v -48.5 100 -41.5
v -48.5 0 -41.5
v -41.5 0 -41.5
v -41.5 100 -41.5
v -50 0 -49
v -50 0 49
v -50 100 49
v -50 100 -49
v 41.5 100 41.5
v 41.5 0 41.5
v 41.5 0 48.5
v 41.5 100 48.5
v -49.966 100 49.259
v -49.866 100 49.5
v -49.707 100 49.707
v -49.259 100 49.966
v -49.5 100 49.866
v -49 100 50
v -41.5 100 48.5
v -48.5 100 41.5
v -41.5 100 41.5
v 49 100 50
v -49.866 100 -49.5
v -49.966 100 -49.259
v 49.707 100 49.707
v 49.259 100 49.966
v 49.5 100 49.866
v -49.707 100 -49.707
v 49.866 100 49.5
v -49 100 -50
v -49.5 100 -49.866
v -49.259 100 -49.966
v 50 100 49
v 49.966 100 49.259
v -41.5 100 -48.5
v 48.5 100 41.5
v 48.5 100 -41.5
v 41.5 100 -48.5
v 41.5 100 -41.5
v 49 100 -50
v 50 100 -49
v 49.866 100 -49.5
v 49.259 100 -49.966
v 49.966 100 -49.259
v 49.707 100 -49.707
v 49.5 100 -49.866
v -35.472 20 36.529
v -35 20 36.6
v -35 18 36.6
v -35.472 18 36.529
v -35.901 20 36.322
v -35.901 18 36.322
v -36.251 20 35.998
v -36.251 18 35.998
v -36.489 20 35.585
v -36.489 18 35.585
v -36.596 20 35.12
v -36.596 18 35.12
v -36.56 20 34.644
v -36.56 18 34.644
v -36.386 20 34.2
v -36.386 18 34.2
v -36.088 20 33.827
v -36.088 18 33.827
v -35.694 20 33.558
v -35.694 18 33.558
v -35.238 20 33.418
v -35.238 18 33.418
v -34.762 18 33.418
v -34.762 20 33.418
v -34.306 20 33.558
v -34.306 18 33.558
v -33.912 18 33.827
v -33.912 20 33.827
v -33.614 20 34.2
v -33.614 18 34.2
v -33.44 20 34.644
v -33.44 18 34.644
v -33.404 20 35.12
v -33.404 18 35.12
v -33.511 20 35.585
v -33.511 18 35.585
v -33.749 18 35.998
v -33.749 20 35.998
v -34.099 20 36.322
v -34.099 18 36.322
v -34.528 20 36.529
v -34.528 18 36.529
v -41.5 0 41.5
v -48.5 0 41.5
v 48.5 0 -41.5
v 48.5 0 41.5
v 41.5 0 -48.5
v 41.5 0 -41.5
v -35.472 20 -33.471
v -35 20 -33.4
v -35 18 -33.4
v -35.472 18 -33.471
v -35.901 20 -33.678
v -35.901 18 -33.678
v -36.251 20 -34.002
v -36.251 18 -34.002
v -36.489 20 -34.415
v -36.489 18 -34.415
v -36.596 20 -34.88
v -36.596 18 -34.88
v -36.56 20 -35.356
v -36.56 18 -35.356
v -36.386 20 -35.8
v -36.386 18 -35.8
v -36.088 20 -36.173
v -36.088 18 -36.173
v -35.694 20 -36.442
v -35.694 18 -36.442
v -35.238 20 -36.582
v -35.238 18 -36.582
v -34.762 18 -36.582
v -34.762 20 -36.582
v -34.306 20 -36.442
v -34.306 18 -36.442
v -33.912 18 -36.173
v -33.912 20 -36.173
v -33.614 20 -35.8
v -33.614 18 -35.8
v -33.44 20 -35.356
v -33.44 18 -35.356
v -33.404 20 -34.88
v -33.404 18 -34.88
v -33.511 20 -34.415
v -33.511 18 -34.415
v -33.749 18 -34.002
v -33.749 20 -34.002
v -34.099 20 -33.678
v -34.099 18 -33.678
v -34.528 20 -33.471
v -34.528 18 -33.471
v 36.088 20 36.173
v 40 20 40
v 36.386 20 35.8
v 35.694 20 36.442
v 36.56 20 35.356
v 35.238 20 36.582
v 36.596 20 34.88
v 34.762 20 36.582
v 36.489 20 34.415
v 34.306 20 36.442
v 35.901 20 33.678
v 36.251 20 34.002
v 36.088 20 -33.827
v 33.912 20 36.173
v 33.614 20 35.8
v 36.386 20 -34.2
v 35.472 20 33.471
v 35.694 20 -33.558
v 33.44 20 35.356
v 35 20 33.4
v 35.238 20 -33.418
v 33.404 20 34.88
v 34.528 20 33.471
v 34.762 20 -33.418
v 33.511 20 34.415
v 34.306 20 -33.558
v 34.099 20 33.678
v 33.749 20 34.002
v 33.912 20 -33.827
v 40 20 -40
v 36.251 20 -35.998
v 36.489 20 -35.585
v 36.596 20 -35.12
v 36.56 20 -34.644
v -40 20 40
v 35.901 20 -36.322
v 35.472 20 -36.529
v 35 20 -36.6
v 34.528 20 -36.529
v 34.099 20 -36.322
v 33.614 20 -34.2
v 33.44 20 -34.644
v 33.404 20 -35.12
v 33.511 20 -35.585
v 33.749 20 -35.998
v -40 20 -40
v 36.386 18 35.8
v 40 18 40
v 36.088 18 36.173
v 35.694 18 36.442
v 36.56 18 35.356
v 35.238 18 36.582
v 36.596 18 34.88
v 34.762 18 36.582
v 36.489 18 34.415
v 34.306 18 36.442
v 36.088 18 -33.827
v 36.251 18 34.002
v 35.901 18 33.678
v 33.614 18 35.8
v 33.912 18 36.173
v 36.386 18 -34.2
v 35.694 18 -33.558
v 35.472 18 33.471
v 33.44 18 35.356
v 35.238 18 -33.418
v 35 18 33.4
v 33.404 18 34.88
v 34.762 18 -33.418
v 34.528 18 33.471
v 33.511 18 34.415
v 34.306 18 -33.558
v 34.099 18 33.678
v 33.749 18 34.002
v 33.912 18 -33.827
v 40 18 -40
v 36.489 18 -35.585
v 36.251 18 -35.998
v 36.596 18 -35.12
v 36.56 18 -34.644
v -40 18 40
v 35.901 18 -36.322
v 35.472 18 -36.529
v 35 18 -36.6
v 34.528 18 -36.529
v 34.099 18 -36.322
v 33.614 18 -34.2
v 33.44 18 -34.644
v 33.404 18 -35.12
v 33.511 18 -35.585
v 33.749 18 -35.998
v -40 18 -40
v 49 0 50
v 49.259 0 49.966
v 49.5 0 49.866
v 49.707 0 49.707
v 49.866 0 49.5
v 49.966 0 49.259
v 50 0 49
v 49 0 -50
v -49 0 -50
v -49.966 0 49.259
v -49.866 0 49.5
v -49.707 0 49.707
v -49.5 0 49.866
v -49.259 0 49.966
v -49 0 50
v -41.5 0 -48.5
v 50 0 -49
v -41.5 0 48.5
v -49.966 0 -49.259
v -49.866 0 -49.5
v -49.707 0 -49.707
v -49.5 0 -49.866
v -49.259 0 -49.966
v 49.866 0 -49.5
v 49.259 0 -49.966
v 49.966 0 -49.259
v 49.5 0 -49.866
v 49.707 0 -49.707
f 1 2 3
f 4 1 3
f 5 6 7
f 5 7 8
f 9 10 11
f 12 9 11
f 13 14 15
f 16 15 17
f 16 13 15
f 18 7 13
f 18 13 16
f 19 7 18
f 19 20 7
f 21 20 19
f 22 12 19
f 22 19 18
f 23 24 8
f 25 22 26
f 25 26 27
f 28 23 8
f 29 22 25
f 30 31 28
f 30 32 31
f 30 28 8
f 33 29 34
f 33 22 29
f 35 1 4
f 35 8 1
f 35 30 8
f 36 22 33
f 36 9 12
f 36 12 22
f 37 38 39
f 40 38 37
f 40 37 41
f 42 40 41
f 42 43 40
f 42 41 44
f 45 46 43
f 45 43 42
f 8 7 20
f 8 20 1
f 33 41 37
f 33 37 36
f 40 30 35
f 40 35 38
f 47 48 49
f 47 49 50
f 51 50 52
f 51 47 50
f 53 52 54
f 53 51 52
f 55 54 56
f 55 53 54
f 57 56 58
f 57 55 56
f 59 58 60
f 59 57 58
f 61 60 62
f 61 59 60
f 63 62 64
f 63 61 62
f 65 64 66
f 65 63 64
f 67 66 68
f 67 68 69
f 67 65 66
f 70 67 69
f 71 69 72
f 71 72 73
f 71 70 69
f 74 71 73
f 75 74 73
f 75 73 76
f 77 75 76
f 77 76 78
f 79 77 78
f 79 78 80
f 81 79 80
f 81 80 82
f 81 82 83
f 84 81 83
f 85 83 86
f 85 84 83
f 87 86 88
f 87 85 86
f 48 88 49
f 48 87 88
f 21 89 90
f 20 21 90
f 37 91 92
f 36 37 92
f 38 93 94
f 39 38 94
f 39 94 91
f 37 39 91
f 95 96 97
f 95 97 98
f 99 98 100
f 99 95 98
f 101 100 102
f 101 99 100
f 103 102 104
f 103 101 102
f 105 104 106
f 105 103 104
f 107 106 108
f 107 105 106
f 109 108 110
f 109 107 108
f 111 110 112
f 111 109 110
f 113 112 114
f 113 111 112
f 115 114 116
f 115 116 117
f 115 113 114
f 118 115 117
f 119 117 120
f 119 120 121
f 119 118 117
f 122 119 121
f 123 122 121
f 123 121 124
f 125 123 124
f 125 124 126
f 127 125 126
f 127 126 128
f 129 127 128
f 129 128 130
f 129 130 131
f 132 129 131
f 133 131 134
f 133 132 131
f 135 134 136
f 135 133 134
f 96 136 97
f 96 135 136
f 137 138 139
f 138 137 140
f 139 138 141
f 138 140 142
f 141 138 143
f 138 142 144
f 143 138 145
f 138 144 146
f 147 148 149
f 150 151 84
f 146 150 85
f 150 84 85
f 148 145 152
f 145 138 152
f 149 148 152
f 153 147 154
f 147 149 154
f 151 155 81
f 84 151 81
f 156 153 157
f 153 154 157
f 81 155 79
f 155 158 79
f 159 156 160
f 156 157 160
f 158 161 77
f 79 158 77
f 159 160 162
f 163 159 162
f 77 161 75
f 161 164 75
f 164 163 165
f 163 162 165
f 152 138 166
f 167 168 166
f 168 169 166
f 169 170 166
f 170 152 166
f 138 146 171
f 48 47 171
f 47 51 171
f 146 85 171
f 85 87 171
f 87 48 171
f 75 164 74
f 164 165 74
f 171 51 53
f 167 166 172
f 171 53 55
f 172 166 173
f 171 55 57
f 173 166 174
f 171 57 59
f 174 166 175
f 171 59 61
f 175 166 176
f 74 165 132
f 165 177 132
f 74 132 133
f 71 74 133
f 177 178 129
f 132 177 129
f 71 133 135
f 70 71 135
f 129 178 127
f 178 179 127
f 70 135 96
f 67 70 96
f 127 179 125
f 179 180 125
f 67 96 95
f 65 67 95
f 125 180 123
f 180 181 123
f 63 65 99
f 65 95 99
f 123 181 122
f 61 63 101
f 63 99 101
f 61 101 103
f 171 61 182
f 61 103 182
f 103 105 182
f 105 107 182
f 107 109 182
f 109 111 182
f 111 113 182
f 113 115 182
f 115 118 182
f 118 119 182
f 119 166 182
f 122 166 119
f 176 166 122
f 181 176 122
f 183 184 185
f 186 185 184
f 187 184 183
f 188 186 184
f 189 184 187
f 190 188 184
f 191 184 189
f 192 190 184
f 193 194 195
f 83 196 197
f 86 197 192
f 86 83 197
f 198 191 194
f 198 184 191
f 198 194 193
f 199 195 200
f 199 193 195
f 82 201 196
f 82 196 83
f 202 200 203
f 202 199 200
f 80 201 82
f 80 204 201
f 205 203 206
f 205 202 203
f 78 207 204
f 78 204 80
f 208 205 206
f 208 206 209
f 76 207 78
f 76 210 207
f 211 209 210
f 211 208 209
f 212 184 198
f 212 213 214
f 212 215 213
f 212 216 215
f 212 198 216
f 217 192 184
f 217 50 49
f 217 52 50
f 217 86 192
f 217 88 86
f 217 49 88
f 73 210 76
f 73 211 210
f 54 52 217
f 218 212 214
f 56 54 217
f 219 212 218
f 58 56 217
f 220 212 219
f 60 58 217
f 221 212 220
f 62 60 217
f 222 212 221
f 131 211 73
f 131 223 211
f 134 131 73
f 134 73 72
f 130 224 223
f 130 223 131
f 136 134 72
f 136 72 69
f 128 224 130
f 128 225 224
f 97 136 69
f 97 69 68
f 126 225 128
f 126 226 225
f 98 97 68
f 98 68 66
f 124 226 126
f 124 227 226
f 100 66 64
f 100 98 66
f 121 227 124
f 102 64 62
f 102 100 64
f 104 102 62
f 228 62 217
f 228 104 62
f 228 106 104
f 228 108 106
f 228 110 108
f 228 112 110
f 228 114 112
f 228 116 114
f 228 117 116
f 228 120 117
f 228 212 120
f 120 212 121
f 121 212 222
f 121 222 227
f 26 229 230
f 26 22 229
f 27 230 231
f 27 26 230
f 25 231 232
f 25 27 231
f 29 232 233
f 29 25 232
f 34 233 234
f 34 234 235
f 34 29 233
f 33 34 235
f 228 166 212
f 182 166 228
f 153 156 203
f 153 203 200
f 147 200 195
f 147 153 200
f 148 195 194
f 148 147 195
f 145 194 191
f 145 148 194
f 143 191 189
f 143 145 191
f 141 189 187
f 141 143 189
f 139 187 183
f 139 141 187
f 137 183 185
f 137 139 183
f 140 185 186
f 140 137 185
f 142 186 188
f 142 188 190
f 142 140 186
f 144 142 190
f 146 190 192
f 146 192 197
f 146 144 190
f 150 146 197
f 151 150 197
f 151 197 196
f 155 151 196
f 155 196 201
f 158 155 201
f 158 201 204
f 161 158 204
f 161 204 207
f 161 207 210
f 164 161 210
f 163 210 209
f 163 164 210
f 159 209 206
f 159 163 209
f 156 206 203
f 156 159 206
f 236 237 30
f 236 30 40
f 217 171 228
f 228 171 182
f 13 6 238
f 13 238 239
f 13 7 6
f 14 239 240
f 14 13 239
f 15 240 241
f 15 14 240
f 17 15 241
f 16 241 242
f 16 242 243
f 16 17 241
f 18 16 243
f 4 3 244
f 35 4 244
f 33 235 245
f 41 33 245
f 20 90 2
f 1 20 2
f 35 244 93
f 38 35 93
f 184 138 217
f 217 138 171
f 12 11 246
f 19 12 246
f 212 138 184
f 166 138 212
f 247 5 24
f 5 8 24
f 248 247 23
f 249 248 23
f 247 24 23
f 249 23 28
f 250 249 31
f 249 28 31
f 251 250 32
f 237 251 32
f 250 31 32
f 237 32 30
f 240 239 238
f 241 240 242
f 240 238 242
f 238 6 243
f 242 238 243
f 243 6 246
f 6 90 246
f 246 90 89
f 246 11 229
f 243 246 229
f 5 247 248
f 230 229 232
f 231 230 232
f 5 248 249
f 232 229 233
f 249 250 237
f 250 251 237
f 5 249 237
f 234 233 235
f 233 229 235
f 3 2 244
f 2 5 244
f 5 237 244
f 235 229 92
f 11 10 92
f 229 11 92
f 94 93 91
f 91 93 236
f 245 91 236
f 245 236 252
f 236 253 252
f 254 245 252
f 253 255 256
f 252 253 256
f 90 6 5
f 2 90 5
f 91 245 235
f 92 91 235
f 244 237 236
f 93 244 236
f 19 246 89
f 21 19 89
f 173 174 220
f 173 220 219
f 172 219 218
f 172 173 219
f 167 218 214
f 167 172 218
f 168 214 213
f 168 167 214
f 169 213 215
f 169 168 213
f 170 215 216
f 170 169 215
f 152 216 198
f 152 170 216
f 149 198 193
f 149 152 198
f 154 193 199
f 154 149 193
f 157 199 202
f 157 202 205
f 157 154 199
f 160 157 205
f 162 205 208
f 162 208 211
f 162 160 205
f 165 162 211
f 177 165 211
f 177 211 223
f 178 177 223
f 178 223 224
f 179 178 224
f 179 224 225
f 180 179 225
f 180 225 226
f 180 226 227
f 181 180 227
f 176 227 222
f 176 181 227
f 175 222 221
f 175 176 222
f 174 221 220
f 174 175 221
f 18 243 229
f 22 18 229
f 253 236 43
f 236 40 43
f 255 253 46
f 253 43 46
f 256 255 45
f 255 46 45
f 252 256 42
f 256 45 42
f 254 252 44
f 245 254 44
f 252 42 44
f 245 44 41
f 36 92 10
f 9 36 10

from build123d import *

# Parameters (mm, degrees)
SKETCH1_W           = 100
SKETCH1_H           = 100
BOSS_EXTRUDE2_DEPTH = 100
SKETCH2_W           = 80
SKETCH2_H           = 80
SKETCH2_R           = 1.6
BOSS_EXTRUDE3_DEPTH = 2
FILLET1_R           = 1


with BuildPart() as part:
    # Sketch1 → Boss-Extrude2 (new body)
    with BuildSketch(Plane(origin=(0, 0, 0), x_dir=(1, 0, 0), z_dir=(0, 1, 0))):
        Rectangle(SKETCH1_W, SKETCH1_H)
        Polygon((41.5, -48.5), (-41.5, -48.5), (-41.5, -41.5), (-48.5, -41.5), (-48.5, 41.5), (-41.5, 41.5), (-41.5, 48.5), (41.5, 48.5), (41.5, 41.5), (48.5, 41.5), (48.5, -41.5), (41.5, -41.5), align=None, mode=Mode.SUBTRACT)
    extrude(amount=BOSS_EXTRUDE2_DEPTH)

    # Fillet1
    fillet1_edges = [part.edges().sort_by_distance(p)[0] for p in [
        (50, 50, -50),
        (50, 50, 50),
        (-50, 50, 50),
        (-50, 50, -50),
    ]]
    fillet(fillet1_edges, radius=FILLET1_R)


with BuildPart() as body_2:
    # Sketch2 → Boss-Extrude3 (new body)
    with BuildSketch(Plane(origin=(0, 20, 0), x_dir=(-1, 0, 0), z_dir=(0, -1, 0))):
        Rectangle(SKETCH2_W, SKETCH2_H)
        with Locations(Location((-35, -35, 0), (0, 0, 90))):
            Circle(SKETCH2_R, mode=Mode.SUBTRACT)
        with Locations(Location((35, 35, 0), (0, 0, 270))):
            Circle(SKETCH2_R, mode=Mode.SUBTRACT)
        with Locations(Location((35, -35, 0), (0, 0, 270))):
            Circle(SKETCH2_R, mode=Mode.SUBTRACT)
        with Locations(Location((-35, 35, 0), (0, 0, 90))):
            Circle(SKETCH2_R, mode=Mode.SUBTRACT)
    extrude(amount=BOSS_EXTRUDE3_DEPTH)


solid = Compound([part.part, body_2.part])
